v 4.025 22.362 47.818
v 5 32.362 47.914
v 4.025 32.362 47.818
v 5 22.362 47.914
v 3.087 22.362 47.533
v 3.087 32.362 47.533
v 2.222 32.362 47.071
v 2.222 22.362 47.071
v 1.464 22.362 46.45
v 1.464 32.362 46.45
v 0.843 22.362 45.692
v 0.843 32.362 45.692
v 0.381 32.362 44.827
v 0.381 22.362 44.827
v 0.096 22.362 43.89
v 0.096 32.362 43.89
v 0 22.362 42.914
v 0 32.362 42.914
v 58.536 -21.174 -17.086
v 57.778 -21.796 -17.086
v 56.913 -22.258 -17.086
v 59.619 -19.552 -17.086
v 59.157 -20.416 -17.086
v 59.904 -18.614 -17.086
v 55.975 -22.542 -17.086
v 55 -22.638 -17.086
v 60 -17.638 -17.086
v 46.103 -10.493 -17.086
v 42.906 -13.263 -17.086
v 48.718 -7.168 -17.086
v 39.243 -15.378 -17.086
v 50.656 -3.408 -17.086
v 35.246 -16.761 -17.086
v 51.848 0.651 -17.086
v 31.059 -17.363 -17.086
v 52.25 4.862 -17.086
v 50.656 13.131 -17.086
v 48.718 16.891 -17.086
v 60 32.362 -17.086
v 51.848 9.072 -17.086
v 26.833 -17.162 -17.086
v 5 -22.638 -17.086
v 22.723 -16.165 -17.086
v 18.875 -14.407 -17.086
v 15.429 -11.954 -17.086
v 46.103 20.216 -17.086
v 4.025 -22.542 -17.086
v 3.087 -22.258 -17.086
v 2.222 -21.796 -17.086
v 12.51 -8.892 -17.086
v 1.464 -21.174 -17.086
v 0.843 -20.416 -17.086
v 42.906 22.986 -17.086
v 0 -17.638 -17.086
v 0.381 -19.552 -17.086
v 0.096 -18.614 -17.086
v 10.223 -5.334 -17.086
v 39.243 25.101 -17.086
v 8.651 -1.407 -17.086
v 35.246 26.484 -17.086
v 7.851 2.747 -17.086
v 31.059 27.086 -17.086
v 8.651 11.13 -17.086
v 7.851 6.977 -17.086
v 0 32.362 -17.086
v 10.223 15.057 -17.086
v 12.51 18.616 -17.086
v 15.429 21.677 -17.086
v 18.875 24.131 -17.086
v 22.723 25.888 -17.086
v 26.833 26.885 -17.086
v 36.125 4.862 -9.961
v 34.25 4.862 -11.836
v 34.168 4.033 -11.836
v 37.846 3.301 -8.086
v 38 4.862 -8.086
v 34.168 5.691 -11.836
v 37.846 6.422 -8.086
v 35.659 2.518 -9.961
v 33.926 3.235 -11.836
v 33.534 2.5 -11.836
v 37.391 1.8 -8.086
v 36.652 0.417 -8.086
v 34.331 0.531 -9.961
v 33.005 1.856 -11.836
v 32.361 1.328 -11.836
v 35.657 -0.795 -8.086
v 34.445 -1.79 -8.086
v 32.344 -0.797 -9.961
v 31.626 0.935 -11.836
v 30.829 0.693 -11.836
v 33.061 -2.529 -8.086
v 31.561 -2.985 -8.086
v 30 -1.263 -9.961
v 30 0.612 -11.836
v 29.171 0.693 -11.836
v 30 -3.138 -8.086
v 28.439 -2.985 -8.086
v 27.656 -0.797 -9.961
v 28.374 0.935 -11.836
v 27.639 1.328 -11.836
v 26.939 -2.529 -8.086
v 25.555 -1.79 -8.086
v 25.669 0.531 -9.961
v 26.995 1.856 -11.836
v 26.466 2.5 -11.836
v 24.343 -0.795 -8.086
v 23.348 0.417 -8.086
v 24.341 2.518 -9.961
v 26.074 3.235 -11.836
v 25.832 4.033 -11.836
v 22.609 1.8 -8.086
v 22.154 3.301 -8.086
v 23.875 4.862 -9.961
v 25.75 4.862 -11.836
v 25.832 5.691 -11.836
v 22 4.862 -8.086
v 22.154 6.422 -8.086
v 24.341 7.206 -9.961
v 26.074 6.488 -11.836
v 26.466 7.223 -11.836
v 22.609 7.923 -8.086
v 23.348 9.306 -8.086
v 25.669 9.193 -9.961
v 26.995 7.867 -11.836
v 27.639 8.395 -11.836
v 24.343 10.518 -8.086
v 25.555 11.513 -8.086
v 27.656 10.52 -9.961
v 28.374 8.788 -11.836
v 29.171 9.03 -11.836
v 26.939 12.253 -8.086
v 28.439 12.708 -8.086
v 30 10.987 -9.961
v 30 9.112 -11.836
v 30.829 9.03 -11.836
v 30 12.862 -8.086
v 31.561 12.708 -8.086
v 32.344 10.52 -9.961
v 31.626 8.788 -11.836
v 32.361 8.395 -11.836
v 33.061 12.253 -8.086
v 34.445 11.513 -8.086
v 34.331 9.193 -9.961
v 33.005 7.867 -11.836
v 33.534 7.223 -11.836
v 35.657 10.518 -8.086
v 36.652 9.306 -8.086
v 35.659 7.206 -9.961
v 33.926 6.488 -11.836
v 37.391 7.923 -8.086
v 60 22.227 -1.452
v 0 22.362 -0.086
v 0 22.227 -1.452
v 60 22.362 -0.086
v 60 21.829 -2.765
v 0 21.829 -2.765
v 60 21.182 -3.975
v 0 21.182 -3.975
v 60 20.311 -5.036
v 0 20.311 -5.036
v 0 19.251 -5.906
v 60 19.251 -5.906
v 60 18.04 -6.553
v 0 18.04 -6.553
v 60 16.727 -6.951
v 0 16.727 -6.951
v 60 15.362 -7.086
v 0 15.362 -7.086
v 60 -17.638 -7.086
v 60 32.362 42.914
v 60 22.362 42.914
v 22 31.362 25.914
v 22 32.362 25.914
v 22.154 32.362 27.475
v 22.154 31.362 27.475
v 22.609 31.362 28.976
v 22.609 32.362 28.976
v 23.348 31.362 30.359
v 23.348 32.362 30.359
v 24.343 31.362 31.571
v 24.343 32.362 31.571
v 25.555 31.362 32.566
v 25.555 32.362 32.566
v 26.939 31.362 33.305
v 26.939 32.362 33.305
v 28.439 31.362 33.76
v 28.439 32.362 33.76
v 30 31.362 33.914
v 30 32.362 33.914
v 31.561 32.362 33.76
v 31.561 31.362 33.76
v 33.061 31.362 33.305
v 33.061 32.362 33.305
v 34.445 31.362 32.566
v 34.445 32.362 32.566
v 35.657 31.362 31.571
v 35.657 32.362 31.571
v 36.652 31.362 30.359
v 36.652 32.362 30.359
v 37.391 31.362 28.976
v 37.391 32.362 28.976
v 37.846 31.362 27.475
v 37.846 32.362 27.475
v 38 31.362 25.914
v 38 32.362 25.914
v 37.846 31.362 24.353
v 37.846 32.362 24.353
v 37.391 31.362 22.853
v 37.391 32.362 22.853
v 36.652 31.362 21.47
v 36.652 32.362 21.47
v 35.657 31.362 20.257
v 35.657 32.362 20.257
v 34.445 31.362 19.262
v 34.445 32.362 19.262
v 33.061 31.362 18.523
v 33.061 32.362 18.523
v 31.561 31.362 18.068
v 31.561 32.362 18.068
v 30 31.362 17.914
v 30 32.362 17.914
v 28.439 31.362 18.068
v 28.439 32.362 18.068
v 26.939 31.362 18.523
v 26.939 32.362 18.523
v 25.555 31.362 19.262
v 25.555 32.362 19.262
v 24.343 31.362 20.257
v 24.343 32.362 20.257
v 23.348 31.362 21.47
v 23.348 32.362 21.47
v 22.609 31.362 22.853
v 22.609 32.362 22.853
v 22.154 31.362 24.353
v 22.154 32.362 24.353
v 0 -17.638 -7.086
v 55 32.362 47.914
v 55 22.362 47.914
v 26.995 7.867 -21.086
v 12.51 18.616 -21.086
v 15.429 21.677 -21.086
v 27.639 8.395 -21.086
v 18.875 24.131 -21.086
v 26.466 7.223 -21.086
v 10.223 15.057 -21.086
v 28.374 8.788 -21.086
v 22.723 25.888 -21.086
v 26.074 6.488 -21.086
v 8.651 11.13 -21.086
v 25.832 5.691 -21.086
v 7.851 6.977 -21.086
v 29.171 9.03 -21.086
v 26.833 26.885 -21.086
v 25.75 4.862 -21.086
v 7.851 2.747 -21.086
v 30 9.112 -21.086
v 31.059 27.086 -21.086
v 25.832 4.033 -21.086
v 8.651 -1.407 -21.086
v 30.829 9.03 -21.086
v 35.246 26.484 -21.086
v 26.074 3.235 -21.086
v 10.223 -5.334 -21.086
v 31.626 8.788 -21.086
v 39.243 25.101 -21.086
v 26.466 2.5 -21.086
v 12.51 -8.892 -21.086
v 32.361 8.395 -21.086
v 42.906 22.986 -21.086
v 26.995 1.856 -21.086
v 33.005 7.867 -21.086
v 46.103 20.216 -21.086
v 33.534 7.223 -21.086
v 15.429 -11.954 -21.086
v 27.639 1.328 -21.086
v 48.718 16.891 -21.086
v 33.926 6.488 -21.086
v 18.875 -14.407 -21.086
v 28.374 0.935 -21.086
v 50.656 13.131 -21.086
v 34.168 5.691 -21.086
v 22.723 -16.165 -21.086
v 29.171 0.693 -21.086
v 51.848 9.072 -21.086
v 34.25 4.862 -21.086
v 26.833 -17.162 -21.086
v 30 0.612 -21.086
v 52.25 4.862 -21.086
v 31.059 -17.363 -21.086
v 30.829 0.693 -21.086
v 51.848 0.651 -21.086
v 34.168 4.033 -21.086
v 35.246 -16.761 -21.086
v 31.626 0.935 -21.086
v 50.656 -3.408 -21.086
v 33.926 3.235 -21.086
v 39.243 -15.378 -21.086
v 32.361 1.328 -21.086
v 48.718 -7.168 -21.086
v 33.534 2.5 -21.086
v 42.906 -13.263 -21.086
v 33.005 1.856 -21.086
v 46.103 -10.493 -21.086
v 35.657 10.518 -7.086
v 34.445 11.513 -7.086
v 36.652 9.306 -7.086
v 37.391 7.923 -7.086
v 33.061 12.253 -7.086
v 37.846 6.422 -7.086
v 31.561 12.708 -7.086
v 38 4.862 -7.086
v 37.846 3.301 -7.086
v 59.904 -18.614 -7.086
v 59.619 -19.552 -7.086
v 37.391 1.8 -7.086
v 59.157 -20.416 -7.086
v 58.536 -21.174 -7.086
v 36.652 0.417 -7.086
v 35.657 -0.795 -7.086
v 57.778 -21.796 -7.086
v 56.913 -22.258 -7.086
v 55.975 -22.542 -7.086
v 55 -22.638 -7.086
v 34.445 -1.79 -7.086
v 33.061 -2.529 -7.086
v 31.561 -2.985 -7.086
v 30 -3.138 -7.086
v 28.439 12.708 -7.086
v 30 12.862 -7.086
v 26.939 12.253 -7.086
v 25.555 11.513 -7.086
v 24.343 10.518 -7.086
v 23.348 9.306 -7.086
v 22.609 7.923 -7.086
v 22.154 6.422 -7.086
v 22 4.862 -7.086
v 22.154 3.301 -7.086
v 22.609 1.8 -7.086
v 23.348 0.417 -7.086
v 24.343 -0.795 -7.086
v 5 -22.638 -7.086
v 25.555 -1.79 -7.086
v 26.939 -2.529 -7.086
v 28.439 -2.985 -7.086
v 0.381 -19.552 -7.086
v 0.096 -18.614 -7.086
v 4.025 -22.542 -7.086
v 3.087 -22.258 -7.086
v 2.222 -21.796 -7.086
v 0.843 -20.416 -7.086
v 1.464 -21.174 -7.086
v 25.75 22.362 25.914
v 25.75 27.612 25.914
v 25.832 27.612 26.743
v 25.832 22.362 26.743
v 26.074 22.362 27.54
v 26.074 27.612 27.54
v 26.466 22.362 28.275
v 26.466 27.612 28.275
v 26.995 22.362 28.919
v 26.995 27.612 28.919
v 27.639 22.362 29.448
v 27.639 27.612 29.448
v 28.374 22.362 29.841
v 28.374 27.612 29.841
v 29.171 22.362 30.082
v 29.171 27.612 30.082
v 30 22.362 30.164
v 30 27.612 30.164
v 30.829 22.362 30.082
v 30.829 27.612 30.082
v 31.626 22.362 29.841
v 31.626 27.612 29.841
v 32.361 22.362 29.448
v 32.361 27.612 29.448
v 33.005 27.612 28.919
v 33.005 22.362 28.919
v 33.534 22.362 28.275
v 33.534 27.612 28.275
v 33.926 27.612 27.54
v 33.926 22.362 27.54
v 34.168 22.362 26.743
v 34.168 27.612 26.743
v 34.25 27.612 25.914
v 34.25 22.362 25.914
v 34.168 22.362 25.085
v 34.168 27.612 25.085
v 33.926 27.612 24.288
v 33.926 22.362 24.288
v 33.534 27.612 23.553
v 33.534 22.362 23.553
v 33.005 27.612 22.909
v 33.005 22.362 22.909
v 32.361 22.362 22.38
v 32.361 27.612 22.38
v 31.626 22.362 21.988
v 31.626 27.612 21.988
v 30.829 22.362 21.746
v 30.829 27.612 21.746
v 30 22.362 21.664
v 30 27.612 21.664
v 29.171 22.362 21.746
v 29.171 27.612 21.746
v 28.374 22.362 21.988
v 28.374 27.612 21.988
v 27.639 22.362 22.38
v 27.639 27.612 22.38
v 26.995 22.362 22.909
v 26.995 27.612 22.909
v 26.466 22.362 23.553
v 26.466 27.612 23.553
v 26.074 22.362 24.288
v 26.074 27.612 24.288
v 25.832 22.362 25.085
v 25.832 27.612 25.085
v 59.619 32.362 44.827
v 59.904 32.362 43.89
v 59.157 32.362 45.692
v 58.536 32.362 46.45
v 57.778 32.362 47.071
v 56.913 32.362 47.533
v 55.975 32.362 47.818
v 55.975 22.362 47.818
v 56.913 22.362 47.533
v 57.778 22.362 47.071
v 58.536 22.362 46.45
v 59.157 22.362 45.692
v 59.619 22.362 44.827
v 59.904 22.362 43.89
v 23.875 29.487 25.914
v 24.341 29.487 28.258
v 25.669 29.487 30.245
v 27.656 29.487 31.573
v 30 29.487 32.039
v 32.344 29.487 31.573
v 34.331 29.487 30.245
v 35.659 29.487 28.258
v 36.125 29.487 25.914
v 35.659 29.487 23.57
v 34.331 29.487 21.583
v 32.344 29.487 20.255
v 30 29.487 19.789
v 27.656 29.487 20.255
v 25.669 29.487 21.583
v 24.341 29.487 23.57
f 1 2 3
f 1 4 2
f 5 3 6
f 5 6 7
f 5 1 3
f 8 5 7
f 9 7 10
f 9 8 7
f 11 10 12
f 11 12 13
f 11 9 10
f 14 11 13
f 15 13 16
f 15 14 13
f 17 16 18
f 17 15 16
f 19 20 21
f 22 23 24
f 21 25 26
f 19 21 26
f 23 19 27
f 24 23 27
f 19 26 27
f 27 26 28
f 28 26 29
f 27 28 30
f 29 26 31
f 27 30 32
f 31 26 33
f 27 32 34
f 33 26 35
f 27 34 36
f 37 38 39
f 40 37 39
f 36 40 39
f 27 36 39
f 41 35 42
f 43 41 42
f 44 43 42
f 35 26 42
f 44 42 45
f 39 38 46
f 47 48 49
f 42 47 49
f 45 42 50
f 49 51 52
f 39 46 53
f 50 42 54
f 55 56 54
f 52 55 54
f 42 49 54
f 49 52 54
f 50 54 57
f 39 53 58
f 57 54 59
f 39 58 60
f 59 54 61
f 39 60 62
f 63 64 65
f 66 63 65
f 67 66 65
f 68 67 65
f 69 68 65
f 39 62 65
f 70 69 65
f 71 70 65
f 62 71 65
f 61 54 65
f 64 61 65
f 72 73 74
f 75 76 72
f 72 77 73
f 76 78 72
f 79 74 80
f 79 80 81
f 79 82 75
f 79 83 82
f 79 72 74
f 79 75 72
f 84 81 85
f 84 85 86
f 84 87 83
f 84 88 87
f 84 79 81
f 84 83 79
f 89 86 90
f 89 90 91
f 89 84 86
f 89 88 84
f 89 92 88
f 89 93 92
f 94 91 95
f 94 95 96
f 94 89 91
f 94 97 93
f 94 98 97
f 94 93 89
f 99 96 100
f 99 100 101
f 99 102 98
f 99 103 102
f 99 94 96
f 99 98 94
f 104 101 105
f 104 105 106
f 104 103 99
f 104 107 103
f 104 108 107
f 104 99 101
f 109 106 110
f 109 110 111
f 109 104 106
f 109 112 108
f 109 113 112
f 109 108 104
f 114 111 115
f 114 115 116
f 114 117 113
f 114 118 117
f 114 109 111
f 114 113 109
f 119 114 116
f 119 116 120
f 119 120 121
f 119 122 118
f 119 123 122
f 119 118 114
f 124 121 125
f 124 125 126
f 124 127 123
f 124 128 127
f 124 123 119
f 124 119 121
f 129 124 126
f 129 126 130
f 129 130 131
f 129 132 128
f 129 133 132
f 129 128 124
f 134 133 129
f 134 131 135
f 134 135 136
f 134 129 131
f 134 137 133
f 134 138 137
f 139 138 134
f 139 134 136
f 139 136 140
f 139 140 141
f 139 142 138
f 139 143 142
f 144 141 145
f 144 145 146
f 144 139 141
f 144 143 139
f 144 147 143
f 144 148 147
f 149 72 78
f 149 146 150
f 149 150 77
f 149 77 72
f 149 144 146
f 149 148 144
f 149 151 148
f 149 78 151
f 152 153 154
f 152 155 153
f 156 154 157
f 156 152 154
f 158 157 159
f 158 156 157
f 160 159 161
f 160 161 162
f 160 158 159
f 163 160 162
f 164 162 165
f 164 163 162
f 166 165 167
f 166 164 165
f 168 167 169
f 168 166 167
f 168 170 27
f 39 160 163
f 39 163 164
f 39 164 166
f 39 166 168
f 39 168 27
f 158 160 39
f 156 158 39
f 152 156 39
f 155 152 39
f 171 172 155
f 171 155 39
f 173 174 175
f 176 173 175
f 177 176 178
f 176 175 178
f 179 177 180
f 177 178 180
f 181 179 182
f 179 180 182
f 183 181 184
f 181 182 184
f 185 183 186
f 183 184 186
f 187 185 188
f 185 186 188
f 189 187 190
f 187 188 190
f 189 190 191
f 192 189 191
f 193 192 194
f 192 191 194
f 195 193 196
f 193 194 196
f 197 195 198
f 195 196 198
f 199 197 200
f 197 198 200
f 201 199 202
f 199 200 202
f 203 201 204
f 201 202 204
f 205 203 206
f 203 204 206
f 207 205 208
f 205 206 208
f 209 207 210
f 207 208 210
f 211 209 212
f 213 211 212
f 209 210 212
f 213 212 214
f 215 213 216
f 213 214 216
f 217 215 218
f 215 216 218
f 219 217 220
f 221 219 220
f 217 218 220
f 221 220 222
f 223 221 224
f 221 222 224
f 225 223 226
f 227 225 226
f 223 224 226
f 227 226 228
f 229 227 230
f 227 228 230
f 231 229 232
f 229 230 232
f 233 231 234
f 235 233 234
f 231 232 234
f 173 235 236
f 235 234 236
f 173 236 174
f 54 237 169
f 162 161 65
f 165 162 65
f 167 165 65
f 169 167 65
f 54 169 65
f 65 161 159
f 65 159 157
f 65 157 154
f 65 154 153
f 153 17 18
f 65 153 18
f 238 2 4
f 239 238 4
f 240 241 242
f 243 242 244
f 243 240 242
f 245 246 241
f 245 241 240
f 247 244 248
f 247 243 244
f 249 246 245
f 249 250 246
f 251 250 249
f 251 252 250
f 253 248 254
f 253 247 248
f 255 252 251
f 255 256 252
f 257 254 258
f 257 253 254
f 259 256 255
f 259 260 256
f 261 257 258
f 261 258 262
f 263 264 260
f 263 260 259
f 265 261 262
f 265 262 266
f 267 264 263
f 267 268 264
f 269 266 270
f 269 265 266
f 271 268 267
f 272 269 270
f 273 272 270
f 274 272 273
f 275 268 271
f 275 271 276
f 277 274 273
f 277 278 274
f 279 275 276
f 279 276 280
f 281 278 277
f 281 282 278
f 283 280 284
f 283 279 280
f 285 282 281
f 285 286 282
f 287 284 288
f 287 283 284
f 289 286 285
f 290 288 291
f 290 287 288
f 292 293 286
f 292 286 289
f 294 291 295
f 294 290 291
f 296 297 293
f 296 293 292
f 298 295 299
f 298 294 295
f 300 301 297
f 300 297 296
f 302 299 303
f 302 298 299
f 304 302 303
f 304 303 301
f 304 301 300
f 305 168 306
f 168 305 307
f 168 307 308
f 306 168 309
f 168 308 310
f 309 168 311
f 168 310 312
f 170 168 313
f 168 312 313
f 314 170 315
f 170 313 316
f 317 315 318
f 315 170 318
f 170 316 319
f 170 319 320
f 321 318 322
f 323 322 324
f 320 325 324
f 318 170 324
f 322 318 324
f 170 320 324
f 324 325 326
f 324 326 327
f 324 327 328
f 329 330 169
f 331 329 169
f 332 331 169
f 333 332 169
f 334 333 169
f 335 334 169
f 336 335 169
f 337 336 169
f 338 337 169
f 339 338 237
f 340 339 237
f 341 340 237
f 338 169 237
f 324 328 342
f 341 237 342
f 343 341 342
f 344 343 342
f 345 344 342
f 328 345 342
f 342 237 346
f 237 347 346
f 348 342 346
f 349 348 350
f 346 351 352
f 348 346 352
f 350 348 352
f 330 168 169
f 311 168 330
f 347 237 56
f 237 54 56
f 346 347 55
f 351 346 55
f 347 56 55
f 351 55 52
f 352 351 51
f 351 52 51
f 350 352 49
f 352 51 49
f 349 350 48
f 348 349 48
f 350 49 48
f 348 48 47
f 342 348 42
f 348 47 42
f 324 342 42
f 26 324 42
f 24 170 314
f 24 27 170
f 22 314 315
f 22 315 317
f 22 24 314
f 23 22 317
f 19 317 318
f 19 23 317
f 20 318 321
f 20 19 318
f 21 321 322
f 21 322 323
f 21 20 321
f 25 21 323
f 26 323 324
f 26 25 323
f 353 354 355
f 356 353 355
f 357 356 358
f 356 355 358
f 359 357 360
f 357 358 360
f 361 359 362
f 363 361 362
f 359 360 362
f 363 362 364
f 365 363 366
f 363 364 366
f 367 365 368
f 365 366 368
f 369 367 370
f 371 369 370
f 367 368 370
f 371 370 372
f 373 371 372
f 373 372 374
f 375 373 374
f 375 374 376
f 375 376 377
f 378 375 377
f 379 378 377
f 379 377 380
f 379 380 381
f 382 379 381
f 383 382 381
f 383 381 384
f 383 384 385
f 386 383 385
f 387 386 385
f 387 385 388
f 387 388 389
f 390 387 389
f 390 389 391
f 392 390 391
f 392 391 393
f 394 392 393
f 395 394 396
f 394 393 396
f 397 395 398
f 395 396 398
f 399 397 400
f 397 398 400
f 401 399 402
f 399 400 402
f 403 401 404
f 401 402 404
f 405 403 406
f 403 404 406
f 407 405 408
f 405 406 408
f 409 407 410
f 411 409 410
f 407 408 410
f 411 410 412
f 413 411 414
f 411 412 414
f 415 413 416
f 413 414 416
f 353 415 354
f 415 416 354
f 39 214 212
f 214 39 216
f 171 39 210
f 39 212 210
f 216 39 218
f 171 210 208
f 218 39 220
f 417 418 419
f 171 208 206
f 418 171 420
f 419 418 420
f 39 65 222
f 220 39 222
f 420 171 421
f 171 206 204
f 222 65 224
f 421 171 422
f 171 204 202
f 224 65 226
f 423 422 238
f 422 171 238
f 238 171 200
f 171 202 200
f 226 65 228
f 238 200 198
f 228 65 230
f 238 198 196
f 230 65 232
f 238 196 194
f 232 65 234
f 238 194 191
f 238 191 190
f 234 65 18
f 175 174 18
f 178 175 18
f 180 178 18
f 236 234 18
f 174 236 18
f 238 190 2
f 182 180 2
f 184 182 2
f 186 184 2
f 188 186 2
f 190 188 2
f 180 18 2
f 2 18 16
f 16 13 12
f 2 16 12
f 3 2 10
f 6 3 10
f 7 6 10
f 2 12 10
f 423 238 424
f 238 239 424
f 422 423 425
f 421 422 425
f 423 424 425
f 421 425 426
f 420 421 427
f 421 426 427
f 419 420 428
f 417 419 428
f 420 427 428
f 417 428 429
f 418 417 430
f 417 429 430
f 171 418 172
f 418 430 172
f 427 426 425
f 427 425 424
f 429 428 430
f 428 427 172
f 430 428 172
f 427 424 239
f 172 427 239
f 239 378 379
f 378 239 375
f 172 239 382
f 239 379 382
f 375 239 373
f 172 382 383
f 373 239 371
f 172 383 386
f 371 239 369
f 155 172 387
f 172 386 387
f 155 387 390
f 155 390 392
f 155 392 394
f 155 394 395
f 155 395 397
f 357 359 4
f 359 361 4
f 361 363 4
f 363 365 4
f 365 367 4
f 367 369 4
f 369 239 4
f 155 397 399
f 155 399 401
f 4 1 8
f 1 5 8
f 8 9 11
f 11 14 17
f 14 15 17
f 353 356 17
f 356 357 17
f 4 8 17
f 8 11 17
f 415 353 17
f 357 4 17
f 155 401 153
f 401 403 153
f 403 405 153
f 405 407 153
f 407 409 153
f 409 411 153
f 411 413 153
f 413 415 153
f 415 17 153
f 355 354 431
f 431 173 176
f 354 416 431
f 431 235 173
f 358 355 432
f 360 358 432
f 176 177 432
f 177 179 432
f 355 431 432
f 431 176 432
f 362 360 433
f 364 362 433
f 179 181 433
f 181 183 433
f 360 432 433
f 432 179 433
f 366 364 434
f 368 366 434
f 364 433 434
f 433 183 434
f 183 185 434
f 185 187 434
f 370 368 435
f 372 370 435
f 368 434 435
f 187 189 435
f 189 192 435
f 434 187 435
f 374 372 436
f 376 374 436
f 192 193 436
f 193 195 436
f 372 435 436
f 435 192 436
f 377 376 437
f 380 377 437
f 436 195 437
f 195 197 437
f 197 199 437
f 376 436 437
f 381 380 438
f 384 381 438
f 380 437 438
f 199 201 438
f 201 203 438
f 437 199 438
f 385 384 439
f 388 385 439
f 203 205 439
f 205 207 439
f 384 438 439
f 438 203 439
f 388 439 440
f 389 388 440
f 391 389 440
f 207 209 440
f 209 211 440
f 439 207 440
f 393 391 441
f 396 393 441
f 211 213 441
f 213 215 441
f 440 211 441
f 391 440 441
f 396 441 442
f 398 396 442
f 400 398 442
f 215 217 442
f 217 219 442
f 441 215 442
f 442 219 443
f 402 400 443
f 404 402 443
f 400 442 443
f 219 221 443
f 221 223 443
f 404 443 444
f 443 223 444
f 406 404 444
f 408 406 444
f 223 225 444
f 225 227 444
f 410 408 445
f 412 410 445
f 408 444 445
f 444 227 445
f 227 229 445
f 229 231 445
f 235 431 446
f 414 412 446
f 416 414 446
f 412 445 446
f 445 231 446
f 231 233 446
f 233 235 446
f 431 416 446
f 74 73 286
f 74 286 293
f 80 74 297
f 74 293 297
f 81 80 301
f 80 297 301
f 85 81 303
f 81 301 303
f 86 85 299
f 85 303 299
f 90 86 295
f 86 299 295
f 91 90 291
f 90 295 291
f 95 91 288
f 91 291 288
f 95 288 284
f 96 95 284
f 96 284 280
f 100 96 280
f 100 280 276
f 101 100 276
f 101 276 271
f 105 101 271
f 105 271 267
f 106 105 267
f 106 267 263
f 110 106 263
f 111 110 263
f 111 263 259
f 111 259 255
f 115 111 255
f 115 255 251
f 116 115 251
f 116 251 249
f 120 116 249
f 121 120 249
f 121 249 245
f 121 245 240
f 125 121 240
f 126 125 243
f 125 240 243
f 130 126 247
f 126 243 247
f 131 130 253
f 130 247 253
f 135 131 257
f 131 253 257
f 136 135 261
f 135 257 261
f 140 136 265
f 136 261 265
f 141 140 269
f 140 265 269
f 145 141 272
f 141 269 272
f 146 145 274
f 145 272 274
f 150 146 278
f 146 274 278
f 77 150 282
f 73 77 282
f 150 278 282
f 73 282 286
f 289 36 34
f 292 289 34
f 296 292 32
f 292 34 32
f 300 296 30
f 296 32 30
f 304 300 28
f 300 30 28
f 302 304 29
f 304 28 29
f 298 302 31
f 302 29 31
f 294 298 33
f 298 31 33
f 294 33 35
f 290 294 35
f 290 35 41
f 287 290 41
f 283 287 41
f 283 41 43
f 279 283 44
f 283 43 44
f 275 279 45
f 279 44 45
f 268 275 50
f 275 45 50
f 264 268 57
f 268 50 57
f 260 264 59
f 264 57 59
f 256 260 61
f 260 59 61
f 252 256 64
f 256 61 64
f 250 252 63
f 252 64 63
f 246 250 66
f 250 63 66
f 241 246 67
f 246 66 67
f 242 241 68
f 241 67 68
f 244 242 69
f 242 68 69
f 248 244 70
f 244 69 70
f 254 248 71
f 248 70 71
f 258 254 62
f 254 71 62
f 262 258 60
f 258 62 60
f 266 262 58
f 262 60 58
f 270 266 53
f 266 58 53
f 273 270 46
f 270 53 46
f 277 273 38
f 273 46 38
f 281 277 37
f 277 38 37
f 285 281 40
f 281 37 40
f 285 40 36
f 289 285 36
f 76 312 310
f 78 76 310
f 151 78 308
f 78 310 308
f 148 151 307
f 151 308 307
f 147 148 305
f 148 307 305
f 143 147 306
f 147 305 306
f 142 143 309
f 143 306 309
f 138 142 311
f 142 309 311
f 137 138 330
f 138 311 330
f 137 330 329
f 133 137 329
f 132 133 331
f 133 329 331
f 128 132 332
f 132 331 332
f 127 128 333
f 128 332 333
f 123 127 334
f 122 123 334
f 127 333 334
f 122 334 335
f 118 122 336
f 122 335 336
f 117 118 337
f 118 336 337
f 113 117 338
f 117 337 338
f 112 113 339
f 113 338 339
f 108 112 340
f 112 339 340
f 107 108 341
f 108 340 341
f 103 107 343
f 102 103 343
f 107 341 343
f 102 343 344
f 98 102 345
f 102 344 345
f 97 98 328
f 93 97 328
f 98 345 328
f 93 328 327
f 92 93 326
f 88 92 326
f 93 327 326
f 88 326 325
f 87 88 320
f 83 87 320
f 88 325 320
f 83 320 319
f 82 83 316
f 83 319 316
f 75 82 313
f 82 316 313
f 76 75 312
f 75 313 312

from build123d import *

# Parameters (mm, degrees)
F1_DEPTH  = 60
F2_R      = 22.25
F3_DEPTH  = 4
F4_R      = 4.25
F5_DEPTH  = 25
F6_R      = 8
F7_DEPTH  = 1
F8_SIZE   = 3.74999
F9_R      = 4.25
F10_DEPTH = 25
F11_R     = 8
F12_DEPTH = 1
F13_SIZE  = 3.74999
F14_R     = 5
F15_R     = 7


# Not quite as in the source:
# - a fillet or chamfer is up to 0.001 mm smaller than in the source, because OpenCascade refuses the exact size


with BuildPart() as f1:
    # F0 (on Right) → F1 (new body)
    with BuildSketch(Plane.YZ):
        Polygon((32.3616418088, -17.0859274204), (32.3616418088, 47.9140725796), (22.3616418088, 47.9140725796), (22.3616418088, -7.0859274204), (-22.6383581912, -7.0859274204), (-22.6383581912, -17.0859274204), align=None)
    extrude(amount=F1_DEPTH)

    # F2 (on face) → F3 (join)
    with BuildSketch(Plane(origin=(0, 0, -17.0859274204), x_dir=(1, 0, 0), z_dir=(0, 0, -1))):
        with Locations((30, -4.8616418088)):
            Circle(F2_R)
    extrude(amount=F3_DEPTH)

    # F4 (on face) → F5 (cut)
    with BuildSketch(Plane(origin=(0, 0, -21.0859274204), x_dir=(1, 0, 0), z_dir=(0, 0, -1))):
        with Locations((30, -4.8616418088)):
            Circle(F4_R)
    extrude(amount=-F5_DEPTH, mode=Mode.SUBTRACT)

    # F6 (on face) → F7 (cut)
    with BuildSketch(Plane.XY.offset(-7.0859274204)):
        with Locations((30, 4.8616418088)):
            Circle(F6_R)
    extrude(amount=-F7_DEPTH, mode=Mode.SUBTRACT)

    # F8 (size 3.75 in the source; OpenCascade refuses exactly that, so slightly less here)
    f8_edges = [f1.edges().sort_by_distance(p)[0] for p in [
        (25.75, 4.861642, -8.085927),
    ]]
    chamfer(f8_edges, length=F8_SIZE)

    # F9 (on face) → F10 (cut)
    with BuildSketch(Plane(origin=(0, 32.3616418088, 0), x_dir=(-1, 0, 0), z_dir=(0, 1, 0))):
        with Locations((-30, 25.9140725796)):
            Circle(F9_R)
    extrude(amount=-F10_DEPTH, mode=Mode.SUBTRACT)

    # F11 (on face) → F12 (cut)
    with BuildSketch(Plane(origin=(0, 32.3616418088, 0), x_dir=(-1, 0, 0), z_dir=(0, 1, 0))):
        with Locations((-30, 25.9140725796)):
            Circle(F11_R)
    extrude(amount=-F12_DEPTH, mode=Mode.SUBTRACT)

    # F13 (size 3.75 in the source; OpenCascade refuses exactly that, so slightly less here)
    f13_edges = [f1.edges().sort_by_distance(p)[0] for p in [
        (34.25, 31.361642, 25.914073),
    ]]
    chamfer(f13_edges, length=F13_SIZE)

    # F14
    f14_edges = [f1.edges().sort_by_distance(p)[0] for p in [
        (0, -22.638358, -12.085927),
        (60, -22.638358, -12.085927),
        (60, 27.361642, 47.914073),
        (0, 27.361642, 47.914073),
    ]]
    fillet(f14_edges, radius=F14_R)

    # F15
    f15_edges = [f1.edges().sort_by_distance(p)[0] for p in [
        (30, 22.361642, -7.085927),
    ]]
    fillet(f15_edges, radius=F15_R)


solid = f1.part
